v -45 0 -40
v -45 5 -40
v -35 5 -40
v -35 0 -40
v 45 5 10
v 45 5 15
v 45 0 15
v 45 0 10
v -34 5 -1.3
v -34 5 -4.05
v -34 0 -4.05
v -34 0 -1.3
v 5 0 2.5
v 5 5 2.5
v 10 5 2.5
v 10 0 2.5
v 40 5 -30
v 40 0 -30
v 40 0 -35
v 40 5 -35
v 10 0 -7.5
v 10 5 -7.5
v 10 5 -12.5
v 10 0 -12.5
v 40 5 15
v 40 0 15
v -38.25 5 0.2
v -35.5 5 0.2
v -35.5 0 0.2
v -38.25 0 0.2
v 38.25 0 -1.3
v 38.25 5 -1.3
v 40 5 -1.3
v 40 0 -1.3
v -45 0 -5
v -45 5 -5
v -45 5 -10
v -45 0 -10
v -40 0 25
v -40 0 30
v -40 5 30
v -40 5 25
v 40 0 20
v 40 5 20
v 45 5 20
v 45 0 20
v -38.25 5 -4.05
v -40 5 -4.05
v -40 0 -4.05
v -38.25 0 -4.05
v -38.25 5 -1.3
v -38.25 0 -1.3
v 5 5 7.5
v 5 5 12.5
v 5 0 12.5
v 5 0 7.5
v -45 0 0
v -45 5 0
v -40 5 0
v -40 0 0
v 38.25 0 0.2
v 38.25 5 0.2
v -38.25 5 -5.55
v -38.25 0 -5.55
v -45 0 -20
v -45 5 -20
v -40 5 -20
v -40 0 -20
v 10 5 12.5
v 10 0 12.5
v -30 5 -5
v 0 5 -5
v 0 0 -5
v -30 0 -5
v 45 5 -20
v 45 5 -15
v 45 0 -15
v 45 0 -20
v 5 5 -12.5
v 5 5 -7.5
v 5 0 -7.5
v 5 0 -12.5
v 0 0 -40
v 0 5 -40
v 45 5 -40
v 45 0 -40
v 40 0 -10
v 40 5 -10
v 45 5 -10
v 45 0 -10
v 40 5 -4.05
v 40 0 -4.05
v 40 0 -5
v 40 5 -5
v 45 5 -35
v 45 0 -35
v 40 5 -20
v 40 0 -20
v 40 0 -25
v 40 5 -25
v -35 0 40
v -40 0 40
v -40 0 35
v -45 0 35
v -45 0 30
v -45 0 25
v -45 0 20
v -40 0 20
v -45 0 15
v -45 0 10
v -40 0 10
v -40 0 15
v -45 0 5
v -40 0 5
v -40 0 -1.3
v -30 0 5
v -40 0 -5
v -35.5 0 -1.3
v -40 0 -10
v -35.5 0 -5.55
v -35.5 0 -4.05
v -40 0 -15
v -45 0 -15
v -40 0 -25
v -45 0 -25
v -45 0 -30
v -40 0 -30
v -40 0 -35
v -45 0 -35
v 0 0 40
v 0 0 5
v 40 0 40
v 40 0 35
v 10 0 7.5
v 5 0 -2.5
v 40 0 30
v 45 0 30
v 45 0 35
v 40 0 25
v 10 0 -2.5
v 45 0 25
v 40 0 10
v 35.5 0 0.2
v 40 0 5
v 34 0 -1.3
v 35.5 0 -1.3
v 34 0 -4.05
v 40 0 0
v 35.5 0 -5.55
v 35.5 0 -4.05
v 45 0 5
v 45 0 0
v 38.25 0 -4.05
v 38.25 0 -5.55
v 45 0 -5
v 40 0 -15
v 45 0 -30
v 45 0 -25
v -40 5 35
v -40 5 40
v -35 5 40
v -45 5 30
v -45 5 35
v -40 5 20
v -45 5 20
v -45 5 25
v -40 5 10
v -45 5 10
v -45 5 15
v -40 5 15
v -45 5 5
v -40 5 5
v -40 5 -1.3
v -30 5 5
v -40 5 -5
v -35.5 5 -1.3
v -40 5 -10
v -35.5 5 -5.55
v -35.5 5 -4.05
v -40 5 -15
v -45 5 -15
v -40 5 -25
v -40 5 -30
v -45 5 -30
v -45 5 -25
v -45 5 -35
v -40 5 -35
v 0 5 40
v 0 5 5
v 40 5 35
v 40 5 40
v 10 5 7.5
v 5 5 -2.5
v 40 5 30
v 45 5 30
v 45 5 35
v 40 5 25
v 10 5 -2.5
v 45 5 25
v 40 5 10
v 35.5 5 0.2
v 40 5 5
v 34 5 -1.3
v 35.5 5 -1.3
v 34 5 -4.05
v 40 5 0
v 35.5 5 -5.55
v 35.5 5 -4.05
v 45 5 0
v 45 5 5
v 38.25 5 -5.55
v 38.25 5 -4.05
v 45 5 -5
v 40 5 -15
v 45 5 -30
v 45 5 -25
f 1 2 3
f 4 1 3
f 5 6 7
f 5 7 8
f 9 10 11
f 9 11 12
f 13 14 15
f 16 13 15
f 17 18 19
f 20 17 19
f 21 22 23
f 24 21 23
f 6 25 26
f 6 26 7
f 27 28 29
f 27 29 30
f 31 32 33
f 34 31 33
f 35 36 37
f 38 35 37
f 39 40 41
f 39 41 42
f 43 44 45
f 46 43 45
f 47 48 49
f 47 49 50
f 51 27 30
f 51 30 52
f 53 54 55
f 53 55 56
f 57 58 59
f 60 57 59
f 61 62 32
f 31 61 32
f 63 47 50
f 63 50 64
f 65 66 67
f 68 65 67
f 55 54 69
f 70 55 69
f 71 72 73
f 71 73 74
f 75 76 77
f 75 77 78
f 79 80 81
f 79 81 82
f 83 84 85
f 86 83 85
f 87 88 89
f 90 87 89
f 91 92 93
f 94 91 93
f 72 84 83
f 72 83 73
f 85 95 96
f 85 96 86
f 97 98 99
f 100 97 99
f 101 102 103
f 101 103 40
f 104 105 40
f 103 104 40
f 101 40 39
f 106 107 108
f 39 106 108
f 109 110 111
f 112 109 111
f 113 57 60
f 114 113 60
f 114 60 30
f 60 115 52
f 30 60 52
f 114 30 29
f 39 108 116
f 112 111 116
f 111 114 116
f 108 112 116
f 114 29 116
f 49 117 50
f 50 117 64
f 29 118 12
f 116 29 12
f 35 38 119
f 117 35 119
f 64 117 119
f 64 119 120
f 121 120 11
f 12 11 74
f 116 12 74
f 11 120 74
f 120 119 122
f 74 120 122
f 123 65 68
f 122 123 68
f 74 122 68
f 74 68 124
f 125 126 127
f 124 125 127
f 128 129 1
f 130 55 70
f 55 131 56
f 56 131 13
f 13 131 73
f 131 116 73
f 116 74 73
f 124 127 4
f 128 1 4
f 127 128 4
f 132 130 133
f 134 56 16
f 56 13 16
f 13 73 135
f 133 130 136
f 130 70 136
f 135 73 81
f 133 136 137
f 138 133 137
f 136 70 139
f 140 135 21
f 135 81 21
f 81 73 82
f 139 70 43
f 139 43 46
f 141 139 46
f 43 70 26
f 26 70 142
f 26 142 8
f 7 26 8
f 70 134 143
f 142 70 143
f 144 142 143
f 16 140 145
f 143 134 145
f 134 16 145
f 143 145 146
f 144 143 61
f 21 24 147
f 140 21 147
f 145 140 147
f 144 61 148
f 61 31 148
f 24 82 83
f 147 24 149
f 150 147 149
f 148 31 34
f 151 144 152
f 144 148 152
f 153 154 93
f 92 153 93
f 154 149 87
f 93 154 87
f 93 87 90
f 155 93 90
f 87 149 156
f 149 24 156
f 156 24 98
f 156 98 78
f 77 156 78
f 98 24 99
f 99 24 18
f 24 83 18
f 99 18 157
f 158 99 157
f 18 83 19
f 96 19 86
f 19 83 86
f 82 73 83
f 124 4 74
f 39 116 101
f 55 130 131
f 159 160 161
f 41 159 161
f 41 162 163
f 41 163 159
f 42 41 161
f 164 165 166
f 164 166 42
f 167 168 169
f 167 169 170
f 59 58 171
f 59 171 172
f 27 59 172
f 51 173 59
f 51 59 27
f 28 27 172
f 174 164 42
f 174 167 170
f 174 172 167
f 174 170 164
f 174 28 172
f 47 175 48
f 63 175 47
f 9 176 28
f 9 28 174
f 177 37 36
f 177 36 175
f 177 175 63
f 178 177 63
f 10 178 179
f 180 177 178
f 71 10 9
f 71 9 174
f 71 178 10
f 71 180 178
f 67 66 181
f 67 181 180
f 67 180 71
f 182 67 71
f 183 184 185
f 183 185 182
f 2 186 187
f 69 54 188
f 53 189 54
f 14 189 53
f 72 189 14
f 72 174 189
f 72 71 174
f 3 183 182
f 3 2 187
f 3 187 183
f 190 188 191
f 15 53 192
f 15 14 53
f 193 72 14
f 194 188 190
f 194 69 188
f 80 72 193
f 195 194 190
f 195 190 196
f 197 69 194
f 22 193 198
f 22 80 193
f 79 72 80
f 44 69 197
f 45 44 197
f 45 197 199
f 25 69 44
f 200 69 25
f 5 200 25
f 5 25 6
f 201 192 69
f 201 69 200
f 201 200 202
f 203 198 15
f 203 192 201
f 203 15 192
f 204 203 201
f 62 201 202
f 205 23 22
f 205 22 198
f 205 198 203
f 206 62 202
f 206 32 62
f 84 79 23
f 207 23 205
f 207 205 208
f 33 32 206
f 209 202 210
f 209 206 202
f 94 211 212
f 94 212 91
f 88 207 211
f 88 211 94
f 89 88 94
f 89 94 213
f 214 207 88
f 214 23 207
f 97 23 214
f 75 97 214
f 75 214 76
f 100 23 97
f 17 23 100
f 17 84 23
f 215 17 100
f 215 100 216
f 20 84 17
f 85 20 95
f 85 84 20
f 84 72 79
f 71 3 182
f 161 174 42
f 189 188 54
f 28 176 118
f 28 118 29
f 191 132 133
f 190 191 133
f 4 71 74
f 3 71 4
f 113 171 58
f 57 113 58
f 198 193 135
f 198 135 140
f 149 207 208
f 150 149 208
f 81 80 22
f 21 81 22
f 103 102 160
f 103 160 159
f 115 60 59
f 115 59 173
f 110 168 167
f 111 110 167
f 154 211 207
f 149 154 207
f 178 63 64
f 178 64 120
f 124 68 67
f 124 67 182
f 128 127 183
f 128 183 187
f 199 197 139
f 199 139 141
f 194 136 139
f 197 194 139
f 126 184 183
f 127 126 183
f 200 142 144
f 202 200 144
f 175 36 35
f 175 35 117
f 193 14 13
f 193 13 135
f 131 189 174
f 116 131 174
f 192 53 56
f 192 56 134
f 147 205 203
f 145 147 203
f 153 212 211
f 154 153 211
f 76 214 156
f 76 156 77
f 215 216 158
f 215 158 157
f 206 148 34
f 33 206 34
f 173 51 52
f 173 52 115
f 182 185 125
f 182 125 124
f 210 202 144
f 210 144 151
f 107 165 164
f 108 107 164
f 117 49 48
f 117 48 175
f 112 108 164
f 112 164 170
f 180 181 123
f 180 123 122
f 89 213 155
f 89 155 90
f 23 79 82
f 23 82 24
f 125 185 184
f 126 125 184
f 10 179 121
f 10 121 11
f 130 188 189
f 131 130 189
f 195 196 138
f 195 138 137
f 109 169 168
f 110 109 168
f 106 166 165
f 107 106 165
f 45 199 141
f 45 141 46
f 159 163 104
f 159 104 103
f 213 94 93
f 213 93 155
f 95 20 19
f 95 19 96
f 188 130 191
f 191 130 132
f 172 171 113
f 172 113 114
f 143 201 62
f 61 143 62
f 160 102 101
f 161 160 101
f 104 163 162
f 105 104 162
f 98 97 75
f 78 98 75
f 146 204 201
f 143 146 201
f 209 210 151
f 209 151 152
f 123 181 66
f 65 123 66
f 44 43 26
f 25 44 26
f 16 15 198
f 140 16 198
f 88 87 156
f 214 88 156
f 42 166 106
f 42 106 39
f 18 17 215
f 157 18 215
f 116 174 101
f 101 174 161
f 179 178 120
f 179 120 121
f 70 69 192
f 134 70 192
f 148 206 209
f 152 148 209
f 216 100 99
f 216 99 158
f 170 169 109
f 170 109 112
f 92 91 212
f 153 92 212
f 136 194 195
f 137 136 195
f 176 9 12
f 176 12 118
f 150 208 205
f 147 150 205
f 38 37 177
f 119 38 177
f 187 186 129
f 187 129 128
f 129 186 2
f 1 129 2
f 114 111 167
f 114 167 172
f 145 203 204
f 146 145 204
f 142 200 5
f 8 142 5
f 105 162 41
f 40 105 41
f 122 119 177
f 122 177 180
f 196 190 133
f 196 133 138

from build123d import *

# Parameters (mm, degrees)
ESQUISSE1_W                     = 80
ESQUISSE1_H                     = 80
BOSS_EXTRU_1_DEPTH              = 5
ESQUISSE2_W                     = 5
ESQUISSE2_H                     = 5
BOSS_EXTRU_2_DEPTH              = 5
R_P_TITION_LIN_AIRE1_COUNT      = 2
R_P_TITION_LIN_AIRE1_PITCH      = 85
R_P_TITION_LIN_AIRE1_COUNT_DIR2 = 8
R_P_TITION_LIN_AIRE1_PITCH_DIR2 = 10
ENL_V_MAT_EXTRU_1_DEPTH         = 10
ESQUISSE9_W                     = 5
ESQUISSE9_H                     = 5
ENL_V_MAT_EXTRU_6_DEPTH         = 10
R_P_TITION_LIN_AIRE4_COUNT      = 2
R_P_TITION_LIN_AIRE4_PITCH      = 10
R_P_TITION_LIN_AIRE4_COL_COUNT  = 2
R_P_TITION_LIN_AIRE4_COL_PITCH  = 10
ENL_V_MAT_EXTRU_7_DEPTH         = 10


with BuildPart() as part:
    # Esquisse1 → Boss.-Extru.1 (new body)
    with BuildSketch(Plane(origin=(0, 0, 0), x_dir=(1, 0, 0), z_dir=(0, 1, 0))):
        Rectangle(ESQUISSE1_W, ESQUISSE1_H)
    extrude(amount=BOSS_EXTRU_1_DEPTH)

    # Esquisse2 → Boss.-Extru.2 (add)
    with BuildSketch(Plane(origin=(0, 5, 0), x_dir=(1, 0, 0), z_dir=(0, 1, 0))):
        with Locations((-42.5, 37.5)):
            Rectangle(ESQUISSE2_W, ESQUISSE2_H)
    boss_extru_2 = extrude(amount=-BOSS_EXTRU_2_DEPTH)

    # Répétition linéaire1: Boss.-Extru.2 2 × 8
    with Locations(*[(i * R_P_TITION_LIN_AIRE1_PITCH, 0, j * R_P_TITION_LIN_AIRE1_PITCH_DIR2) for i in range(R_P_TITION_LIN_AIRE1_COUNT) for j in range(R_P_TITION_LIN_AIRE1_COUNT_DIR2) if (i, j) != (0, 0)]):
        add(boss_extru_2)

    # Esquisse3 → Enlèv. mat.-Extru.1 (cut)
    with BuildSketch(Plane(origin=(0, 5, 0), x_dir=(1, 0, 0), z_dir=(0, 1, 0))):
        Polygon((40, 4.05), (38.25, 4.05), (38.25, 5.55), (35.5, 5.55), (35.5, 4.05), (34, 4.05), (34, 1.3), (35.5, 1.3), (35.5, -0.2), (38.25, -0.2), (38.25, 1.3), (40, 1.3), align=None)
    enl_v_mat_extru_1 = extrude(amount=-ENL_V_MAT_EXTRU_1_DEPTH, mode=Mode.SUBTRACT)

    # Esquisse9 → Enlèv. mat.-Extru.6 (cut)
    with BuildSketch(Plane(origin=(0, 5, 0), x_dir=(1, 0, 0), z_dir=(0, 1, 0))):
        with Locations((7.5, 0)):
            Rectangle(ESQUISSE9_W, ESQUISSE9_H)
    enl_v_mat_extru_6 = extrude(amount=-ENL_V_MAT_EXTRU_6_DEPTH, mode=Mode.SUBTRACT)

    # Répétition linéaire4: Enlèv. mat.-Extru.6 ×2
    with Locations(*[(0, 0, -i * R_P_TITION_LIN_AIRE4_PITCH) for i in range(1, R_P_TITION_LIN_AIRE4_COUNT)]):
        add(enl_v_mat_extru_6, mode=Mode.SUBTRACT)

    # Répétition linéaire4 col: Enlèv. mat.-Extru.6 ×2
    with Locations(*[(0, 0, i * R_P_TITION_LIN_AIRE4_COL_PITCH) for i in range(1, R_P_TITION_LIN_AIRE4_COL_COUNT)]):
        add(enl_v_mat_extru_6, mode=Mode.SUBTRACT)

    # Symétrie3: Enlèv. mat.-Extru.1 across plane
    add(enl_v_mat_extru_1.mirror(Plane(origin=(0, 0, 0), x_dir=(0, 0, 1), z_dir=(1, 0, 0))), mode=Mode.SUBTRACT)

    # Esquisse7 → Enlèv. mat.-Extru.7 (cut)
    with BuildSketch(Plane(origin=(0, 5, 0), x_dir=(1, 0, 0), z_dir=(0, 1, 0))):
        Polygon((-35, 40), (0, 40), (0, 5), (-30, 5), align=None)
        Polygon((-35, -40), (0, -40), (0, -5), (-30, -5), align=None)
    extrude(amount=-ENL_V_MAT_EXTRU_7_DEPTH, mode=Mode.SUBTRACT)


solid = part.part
